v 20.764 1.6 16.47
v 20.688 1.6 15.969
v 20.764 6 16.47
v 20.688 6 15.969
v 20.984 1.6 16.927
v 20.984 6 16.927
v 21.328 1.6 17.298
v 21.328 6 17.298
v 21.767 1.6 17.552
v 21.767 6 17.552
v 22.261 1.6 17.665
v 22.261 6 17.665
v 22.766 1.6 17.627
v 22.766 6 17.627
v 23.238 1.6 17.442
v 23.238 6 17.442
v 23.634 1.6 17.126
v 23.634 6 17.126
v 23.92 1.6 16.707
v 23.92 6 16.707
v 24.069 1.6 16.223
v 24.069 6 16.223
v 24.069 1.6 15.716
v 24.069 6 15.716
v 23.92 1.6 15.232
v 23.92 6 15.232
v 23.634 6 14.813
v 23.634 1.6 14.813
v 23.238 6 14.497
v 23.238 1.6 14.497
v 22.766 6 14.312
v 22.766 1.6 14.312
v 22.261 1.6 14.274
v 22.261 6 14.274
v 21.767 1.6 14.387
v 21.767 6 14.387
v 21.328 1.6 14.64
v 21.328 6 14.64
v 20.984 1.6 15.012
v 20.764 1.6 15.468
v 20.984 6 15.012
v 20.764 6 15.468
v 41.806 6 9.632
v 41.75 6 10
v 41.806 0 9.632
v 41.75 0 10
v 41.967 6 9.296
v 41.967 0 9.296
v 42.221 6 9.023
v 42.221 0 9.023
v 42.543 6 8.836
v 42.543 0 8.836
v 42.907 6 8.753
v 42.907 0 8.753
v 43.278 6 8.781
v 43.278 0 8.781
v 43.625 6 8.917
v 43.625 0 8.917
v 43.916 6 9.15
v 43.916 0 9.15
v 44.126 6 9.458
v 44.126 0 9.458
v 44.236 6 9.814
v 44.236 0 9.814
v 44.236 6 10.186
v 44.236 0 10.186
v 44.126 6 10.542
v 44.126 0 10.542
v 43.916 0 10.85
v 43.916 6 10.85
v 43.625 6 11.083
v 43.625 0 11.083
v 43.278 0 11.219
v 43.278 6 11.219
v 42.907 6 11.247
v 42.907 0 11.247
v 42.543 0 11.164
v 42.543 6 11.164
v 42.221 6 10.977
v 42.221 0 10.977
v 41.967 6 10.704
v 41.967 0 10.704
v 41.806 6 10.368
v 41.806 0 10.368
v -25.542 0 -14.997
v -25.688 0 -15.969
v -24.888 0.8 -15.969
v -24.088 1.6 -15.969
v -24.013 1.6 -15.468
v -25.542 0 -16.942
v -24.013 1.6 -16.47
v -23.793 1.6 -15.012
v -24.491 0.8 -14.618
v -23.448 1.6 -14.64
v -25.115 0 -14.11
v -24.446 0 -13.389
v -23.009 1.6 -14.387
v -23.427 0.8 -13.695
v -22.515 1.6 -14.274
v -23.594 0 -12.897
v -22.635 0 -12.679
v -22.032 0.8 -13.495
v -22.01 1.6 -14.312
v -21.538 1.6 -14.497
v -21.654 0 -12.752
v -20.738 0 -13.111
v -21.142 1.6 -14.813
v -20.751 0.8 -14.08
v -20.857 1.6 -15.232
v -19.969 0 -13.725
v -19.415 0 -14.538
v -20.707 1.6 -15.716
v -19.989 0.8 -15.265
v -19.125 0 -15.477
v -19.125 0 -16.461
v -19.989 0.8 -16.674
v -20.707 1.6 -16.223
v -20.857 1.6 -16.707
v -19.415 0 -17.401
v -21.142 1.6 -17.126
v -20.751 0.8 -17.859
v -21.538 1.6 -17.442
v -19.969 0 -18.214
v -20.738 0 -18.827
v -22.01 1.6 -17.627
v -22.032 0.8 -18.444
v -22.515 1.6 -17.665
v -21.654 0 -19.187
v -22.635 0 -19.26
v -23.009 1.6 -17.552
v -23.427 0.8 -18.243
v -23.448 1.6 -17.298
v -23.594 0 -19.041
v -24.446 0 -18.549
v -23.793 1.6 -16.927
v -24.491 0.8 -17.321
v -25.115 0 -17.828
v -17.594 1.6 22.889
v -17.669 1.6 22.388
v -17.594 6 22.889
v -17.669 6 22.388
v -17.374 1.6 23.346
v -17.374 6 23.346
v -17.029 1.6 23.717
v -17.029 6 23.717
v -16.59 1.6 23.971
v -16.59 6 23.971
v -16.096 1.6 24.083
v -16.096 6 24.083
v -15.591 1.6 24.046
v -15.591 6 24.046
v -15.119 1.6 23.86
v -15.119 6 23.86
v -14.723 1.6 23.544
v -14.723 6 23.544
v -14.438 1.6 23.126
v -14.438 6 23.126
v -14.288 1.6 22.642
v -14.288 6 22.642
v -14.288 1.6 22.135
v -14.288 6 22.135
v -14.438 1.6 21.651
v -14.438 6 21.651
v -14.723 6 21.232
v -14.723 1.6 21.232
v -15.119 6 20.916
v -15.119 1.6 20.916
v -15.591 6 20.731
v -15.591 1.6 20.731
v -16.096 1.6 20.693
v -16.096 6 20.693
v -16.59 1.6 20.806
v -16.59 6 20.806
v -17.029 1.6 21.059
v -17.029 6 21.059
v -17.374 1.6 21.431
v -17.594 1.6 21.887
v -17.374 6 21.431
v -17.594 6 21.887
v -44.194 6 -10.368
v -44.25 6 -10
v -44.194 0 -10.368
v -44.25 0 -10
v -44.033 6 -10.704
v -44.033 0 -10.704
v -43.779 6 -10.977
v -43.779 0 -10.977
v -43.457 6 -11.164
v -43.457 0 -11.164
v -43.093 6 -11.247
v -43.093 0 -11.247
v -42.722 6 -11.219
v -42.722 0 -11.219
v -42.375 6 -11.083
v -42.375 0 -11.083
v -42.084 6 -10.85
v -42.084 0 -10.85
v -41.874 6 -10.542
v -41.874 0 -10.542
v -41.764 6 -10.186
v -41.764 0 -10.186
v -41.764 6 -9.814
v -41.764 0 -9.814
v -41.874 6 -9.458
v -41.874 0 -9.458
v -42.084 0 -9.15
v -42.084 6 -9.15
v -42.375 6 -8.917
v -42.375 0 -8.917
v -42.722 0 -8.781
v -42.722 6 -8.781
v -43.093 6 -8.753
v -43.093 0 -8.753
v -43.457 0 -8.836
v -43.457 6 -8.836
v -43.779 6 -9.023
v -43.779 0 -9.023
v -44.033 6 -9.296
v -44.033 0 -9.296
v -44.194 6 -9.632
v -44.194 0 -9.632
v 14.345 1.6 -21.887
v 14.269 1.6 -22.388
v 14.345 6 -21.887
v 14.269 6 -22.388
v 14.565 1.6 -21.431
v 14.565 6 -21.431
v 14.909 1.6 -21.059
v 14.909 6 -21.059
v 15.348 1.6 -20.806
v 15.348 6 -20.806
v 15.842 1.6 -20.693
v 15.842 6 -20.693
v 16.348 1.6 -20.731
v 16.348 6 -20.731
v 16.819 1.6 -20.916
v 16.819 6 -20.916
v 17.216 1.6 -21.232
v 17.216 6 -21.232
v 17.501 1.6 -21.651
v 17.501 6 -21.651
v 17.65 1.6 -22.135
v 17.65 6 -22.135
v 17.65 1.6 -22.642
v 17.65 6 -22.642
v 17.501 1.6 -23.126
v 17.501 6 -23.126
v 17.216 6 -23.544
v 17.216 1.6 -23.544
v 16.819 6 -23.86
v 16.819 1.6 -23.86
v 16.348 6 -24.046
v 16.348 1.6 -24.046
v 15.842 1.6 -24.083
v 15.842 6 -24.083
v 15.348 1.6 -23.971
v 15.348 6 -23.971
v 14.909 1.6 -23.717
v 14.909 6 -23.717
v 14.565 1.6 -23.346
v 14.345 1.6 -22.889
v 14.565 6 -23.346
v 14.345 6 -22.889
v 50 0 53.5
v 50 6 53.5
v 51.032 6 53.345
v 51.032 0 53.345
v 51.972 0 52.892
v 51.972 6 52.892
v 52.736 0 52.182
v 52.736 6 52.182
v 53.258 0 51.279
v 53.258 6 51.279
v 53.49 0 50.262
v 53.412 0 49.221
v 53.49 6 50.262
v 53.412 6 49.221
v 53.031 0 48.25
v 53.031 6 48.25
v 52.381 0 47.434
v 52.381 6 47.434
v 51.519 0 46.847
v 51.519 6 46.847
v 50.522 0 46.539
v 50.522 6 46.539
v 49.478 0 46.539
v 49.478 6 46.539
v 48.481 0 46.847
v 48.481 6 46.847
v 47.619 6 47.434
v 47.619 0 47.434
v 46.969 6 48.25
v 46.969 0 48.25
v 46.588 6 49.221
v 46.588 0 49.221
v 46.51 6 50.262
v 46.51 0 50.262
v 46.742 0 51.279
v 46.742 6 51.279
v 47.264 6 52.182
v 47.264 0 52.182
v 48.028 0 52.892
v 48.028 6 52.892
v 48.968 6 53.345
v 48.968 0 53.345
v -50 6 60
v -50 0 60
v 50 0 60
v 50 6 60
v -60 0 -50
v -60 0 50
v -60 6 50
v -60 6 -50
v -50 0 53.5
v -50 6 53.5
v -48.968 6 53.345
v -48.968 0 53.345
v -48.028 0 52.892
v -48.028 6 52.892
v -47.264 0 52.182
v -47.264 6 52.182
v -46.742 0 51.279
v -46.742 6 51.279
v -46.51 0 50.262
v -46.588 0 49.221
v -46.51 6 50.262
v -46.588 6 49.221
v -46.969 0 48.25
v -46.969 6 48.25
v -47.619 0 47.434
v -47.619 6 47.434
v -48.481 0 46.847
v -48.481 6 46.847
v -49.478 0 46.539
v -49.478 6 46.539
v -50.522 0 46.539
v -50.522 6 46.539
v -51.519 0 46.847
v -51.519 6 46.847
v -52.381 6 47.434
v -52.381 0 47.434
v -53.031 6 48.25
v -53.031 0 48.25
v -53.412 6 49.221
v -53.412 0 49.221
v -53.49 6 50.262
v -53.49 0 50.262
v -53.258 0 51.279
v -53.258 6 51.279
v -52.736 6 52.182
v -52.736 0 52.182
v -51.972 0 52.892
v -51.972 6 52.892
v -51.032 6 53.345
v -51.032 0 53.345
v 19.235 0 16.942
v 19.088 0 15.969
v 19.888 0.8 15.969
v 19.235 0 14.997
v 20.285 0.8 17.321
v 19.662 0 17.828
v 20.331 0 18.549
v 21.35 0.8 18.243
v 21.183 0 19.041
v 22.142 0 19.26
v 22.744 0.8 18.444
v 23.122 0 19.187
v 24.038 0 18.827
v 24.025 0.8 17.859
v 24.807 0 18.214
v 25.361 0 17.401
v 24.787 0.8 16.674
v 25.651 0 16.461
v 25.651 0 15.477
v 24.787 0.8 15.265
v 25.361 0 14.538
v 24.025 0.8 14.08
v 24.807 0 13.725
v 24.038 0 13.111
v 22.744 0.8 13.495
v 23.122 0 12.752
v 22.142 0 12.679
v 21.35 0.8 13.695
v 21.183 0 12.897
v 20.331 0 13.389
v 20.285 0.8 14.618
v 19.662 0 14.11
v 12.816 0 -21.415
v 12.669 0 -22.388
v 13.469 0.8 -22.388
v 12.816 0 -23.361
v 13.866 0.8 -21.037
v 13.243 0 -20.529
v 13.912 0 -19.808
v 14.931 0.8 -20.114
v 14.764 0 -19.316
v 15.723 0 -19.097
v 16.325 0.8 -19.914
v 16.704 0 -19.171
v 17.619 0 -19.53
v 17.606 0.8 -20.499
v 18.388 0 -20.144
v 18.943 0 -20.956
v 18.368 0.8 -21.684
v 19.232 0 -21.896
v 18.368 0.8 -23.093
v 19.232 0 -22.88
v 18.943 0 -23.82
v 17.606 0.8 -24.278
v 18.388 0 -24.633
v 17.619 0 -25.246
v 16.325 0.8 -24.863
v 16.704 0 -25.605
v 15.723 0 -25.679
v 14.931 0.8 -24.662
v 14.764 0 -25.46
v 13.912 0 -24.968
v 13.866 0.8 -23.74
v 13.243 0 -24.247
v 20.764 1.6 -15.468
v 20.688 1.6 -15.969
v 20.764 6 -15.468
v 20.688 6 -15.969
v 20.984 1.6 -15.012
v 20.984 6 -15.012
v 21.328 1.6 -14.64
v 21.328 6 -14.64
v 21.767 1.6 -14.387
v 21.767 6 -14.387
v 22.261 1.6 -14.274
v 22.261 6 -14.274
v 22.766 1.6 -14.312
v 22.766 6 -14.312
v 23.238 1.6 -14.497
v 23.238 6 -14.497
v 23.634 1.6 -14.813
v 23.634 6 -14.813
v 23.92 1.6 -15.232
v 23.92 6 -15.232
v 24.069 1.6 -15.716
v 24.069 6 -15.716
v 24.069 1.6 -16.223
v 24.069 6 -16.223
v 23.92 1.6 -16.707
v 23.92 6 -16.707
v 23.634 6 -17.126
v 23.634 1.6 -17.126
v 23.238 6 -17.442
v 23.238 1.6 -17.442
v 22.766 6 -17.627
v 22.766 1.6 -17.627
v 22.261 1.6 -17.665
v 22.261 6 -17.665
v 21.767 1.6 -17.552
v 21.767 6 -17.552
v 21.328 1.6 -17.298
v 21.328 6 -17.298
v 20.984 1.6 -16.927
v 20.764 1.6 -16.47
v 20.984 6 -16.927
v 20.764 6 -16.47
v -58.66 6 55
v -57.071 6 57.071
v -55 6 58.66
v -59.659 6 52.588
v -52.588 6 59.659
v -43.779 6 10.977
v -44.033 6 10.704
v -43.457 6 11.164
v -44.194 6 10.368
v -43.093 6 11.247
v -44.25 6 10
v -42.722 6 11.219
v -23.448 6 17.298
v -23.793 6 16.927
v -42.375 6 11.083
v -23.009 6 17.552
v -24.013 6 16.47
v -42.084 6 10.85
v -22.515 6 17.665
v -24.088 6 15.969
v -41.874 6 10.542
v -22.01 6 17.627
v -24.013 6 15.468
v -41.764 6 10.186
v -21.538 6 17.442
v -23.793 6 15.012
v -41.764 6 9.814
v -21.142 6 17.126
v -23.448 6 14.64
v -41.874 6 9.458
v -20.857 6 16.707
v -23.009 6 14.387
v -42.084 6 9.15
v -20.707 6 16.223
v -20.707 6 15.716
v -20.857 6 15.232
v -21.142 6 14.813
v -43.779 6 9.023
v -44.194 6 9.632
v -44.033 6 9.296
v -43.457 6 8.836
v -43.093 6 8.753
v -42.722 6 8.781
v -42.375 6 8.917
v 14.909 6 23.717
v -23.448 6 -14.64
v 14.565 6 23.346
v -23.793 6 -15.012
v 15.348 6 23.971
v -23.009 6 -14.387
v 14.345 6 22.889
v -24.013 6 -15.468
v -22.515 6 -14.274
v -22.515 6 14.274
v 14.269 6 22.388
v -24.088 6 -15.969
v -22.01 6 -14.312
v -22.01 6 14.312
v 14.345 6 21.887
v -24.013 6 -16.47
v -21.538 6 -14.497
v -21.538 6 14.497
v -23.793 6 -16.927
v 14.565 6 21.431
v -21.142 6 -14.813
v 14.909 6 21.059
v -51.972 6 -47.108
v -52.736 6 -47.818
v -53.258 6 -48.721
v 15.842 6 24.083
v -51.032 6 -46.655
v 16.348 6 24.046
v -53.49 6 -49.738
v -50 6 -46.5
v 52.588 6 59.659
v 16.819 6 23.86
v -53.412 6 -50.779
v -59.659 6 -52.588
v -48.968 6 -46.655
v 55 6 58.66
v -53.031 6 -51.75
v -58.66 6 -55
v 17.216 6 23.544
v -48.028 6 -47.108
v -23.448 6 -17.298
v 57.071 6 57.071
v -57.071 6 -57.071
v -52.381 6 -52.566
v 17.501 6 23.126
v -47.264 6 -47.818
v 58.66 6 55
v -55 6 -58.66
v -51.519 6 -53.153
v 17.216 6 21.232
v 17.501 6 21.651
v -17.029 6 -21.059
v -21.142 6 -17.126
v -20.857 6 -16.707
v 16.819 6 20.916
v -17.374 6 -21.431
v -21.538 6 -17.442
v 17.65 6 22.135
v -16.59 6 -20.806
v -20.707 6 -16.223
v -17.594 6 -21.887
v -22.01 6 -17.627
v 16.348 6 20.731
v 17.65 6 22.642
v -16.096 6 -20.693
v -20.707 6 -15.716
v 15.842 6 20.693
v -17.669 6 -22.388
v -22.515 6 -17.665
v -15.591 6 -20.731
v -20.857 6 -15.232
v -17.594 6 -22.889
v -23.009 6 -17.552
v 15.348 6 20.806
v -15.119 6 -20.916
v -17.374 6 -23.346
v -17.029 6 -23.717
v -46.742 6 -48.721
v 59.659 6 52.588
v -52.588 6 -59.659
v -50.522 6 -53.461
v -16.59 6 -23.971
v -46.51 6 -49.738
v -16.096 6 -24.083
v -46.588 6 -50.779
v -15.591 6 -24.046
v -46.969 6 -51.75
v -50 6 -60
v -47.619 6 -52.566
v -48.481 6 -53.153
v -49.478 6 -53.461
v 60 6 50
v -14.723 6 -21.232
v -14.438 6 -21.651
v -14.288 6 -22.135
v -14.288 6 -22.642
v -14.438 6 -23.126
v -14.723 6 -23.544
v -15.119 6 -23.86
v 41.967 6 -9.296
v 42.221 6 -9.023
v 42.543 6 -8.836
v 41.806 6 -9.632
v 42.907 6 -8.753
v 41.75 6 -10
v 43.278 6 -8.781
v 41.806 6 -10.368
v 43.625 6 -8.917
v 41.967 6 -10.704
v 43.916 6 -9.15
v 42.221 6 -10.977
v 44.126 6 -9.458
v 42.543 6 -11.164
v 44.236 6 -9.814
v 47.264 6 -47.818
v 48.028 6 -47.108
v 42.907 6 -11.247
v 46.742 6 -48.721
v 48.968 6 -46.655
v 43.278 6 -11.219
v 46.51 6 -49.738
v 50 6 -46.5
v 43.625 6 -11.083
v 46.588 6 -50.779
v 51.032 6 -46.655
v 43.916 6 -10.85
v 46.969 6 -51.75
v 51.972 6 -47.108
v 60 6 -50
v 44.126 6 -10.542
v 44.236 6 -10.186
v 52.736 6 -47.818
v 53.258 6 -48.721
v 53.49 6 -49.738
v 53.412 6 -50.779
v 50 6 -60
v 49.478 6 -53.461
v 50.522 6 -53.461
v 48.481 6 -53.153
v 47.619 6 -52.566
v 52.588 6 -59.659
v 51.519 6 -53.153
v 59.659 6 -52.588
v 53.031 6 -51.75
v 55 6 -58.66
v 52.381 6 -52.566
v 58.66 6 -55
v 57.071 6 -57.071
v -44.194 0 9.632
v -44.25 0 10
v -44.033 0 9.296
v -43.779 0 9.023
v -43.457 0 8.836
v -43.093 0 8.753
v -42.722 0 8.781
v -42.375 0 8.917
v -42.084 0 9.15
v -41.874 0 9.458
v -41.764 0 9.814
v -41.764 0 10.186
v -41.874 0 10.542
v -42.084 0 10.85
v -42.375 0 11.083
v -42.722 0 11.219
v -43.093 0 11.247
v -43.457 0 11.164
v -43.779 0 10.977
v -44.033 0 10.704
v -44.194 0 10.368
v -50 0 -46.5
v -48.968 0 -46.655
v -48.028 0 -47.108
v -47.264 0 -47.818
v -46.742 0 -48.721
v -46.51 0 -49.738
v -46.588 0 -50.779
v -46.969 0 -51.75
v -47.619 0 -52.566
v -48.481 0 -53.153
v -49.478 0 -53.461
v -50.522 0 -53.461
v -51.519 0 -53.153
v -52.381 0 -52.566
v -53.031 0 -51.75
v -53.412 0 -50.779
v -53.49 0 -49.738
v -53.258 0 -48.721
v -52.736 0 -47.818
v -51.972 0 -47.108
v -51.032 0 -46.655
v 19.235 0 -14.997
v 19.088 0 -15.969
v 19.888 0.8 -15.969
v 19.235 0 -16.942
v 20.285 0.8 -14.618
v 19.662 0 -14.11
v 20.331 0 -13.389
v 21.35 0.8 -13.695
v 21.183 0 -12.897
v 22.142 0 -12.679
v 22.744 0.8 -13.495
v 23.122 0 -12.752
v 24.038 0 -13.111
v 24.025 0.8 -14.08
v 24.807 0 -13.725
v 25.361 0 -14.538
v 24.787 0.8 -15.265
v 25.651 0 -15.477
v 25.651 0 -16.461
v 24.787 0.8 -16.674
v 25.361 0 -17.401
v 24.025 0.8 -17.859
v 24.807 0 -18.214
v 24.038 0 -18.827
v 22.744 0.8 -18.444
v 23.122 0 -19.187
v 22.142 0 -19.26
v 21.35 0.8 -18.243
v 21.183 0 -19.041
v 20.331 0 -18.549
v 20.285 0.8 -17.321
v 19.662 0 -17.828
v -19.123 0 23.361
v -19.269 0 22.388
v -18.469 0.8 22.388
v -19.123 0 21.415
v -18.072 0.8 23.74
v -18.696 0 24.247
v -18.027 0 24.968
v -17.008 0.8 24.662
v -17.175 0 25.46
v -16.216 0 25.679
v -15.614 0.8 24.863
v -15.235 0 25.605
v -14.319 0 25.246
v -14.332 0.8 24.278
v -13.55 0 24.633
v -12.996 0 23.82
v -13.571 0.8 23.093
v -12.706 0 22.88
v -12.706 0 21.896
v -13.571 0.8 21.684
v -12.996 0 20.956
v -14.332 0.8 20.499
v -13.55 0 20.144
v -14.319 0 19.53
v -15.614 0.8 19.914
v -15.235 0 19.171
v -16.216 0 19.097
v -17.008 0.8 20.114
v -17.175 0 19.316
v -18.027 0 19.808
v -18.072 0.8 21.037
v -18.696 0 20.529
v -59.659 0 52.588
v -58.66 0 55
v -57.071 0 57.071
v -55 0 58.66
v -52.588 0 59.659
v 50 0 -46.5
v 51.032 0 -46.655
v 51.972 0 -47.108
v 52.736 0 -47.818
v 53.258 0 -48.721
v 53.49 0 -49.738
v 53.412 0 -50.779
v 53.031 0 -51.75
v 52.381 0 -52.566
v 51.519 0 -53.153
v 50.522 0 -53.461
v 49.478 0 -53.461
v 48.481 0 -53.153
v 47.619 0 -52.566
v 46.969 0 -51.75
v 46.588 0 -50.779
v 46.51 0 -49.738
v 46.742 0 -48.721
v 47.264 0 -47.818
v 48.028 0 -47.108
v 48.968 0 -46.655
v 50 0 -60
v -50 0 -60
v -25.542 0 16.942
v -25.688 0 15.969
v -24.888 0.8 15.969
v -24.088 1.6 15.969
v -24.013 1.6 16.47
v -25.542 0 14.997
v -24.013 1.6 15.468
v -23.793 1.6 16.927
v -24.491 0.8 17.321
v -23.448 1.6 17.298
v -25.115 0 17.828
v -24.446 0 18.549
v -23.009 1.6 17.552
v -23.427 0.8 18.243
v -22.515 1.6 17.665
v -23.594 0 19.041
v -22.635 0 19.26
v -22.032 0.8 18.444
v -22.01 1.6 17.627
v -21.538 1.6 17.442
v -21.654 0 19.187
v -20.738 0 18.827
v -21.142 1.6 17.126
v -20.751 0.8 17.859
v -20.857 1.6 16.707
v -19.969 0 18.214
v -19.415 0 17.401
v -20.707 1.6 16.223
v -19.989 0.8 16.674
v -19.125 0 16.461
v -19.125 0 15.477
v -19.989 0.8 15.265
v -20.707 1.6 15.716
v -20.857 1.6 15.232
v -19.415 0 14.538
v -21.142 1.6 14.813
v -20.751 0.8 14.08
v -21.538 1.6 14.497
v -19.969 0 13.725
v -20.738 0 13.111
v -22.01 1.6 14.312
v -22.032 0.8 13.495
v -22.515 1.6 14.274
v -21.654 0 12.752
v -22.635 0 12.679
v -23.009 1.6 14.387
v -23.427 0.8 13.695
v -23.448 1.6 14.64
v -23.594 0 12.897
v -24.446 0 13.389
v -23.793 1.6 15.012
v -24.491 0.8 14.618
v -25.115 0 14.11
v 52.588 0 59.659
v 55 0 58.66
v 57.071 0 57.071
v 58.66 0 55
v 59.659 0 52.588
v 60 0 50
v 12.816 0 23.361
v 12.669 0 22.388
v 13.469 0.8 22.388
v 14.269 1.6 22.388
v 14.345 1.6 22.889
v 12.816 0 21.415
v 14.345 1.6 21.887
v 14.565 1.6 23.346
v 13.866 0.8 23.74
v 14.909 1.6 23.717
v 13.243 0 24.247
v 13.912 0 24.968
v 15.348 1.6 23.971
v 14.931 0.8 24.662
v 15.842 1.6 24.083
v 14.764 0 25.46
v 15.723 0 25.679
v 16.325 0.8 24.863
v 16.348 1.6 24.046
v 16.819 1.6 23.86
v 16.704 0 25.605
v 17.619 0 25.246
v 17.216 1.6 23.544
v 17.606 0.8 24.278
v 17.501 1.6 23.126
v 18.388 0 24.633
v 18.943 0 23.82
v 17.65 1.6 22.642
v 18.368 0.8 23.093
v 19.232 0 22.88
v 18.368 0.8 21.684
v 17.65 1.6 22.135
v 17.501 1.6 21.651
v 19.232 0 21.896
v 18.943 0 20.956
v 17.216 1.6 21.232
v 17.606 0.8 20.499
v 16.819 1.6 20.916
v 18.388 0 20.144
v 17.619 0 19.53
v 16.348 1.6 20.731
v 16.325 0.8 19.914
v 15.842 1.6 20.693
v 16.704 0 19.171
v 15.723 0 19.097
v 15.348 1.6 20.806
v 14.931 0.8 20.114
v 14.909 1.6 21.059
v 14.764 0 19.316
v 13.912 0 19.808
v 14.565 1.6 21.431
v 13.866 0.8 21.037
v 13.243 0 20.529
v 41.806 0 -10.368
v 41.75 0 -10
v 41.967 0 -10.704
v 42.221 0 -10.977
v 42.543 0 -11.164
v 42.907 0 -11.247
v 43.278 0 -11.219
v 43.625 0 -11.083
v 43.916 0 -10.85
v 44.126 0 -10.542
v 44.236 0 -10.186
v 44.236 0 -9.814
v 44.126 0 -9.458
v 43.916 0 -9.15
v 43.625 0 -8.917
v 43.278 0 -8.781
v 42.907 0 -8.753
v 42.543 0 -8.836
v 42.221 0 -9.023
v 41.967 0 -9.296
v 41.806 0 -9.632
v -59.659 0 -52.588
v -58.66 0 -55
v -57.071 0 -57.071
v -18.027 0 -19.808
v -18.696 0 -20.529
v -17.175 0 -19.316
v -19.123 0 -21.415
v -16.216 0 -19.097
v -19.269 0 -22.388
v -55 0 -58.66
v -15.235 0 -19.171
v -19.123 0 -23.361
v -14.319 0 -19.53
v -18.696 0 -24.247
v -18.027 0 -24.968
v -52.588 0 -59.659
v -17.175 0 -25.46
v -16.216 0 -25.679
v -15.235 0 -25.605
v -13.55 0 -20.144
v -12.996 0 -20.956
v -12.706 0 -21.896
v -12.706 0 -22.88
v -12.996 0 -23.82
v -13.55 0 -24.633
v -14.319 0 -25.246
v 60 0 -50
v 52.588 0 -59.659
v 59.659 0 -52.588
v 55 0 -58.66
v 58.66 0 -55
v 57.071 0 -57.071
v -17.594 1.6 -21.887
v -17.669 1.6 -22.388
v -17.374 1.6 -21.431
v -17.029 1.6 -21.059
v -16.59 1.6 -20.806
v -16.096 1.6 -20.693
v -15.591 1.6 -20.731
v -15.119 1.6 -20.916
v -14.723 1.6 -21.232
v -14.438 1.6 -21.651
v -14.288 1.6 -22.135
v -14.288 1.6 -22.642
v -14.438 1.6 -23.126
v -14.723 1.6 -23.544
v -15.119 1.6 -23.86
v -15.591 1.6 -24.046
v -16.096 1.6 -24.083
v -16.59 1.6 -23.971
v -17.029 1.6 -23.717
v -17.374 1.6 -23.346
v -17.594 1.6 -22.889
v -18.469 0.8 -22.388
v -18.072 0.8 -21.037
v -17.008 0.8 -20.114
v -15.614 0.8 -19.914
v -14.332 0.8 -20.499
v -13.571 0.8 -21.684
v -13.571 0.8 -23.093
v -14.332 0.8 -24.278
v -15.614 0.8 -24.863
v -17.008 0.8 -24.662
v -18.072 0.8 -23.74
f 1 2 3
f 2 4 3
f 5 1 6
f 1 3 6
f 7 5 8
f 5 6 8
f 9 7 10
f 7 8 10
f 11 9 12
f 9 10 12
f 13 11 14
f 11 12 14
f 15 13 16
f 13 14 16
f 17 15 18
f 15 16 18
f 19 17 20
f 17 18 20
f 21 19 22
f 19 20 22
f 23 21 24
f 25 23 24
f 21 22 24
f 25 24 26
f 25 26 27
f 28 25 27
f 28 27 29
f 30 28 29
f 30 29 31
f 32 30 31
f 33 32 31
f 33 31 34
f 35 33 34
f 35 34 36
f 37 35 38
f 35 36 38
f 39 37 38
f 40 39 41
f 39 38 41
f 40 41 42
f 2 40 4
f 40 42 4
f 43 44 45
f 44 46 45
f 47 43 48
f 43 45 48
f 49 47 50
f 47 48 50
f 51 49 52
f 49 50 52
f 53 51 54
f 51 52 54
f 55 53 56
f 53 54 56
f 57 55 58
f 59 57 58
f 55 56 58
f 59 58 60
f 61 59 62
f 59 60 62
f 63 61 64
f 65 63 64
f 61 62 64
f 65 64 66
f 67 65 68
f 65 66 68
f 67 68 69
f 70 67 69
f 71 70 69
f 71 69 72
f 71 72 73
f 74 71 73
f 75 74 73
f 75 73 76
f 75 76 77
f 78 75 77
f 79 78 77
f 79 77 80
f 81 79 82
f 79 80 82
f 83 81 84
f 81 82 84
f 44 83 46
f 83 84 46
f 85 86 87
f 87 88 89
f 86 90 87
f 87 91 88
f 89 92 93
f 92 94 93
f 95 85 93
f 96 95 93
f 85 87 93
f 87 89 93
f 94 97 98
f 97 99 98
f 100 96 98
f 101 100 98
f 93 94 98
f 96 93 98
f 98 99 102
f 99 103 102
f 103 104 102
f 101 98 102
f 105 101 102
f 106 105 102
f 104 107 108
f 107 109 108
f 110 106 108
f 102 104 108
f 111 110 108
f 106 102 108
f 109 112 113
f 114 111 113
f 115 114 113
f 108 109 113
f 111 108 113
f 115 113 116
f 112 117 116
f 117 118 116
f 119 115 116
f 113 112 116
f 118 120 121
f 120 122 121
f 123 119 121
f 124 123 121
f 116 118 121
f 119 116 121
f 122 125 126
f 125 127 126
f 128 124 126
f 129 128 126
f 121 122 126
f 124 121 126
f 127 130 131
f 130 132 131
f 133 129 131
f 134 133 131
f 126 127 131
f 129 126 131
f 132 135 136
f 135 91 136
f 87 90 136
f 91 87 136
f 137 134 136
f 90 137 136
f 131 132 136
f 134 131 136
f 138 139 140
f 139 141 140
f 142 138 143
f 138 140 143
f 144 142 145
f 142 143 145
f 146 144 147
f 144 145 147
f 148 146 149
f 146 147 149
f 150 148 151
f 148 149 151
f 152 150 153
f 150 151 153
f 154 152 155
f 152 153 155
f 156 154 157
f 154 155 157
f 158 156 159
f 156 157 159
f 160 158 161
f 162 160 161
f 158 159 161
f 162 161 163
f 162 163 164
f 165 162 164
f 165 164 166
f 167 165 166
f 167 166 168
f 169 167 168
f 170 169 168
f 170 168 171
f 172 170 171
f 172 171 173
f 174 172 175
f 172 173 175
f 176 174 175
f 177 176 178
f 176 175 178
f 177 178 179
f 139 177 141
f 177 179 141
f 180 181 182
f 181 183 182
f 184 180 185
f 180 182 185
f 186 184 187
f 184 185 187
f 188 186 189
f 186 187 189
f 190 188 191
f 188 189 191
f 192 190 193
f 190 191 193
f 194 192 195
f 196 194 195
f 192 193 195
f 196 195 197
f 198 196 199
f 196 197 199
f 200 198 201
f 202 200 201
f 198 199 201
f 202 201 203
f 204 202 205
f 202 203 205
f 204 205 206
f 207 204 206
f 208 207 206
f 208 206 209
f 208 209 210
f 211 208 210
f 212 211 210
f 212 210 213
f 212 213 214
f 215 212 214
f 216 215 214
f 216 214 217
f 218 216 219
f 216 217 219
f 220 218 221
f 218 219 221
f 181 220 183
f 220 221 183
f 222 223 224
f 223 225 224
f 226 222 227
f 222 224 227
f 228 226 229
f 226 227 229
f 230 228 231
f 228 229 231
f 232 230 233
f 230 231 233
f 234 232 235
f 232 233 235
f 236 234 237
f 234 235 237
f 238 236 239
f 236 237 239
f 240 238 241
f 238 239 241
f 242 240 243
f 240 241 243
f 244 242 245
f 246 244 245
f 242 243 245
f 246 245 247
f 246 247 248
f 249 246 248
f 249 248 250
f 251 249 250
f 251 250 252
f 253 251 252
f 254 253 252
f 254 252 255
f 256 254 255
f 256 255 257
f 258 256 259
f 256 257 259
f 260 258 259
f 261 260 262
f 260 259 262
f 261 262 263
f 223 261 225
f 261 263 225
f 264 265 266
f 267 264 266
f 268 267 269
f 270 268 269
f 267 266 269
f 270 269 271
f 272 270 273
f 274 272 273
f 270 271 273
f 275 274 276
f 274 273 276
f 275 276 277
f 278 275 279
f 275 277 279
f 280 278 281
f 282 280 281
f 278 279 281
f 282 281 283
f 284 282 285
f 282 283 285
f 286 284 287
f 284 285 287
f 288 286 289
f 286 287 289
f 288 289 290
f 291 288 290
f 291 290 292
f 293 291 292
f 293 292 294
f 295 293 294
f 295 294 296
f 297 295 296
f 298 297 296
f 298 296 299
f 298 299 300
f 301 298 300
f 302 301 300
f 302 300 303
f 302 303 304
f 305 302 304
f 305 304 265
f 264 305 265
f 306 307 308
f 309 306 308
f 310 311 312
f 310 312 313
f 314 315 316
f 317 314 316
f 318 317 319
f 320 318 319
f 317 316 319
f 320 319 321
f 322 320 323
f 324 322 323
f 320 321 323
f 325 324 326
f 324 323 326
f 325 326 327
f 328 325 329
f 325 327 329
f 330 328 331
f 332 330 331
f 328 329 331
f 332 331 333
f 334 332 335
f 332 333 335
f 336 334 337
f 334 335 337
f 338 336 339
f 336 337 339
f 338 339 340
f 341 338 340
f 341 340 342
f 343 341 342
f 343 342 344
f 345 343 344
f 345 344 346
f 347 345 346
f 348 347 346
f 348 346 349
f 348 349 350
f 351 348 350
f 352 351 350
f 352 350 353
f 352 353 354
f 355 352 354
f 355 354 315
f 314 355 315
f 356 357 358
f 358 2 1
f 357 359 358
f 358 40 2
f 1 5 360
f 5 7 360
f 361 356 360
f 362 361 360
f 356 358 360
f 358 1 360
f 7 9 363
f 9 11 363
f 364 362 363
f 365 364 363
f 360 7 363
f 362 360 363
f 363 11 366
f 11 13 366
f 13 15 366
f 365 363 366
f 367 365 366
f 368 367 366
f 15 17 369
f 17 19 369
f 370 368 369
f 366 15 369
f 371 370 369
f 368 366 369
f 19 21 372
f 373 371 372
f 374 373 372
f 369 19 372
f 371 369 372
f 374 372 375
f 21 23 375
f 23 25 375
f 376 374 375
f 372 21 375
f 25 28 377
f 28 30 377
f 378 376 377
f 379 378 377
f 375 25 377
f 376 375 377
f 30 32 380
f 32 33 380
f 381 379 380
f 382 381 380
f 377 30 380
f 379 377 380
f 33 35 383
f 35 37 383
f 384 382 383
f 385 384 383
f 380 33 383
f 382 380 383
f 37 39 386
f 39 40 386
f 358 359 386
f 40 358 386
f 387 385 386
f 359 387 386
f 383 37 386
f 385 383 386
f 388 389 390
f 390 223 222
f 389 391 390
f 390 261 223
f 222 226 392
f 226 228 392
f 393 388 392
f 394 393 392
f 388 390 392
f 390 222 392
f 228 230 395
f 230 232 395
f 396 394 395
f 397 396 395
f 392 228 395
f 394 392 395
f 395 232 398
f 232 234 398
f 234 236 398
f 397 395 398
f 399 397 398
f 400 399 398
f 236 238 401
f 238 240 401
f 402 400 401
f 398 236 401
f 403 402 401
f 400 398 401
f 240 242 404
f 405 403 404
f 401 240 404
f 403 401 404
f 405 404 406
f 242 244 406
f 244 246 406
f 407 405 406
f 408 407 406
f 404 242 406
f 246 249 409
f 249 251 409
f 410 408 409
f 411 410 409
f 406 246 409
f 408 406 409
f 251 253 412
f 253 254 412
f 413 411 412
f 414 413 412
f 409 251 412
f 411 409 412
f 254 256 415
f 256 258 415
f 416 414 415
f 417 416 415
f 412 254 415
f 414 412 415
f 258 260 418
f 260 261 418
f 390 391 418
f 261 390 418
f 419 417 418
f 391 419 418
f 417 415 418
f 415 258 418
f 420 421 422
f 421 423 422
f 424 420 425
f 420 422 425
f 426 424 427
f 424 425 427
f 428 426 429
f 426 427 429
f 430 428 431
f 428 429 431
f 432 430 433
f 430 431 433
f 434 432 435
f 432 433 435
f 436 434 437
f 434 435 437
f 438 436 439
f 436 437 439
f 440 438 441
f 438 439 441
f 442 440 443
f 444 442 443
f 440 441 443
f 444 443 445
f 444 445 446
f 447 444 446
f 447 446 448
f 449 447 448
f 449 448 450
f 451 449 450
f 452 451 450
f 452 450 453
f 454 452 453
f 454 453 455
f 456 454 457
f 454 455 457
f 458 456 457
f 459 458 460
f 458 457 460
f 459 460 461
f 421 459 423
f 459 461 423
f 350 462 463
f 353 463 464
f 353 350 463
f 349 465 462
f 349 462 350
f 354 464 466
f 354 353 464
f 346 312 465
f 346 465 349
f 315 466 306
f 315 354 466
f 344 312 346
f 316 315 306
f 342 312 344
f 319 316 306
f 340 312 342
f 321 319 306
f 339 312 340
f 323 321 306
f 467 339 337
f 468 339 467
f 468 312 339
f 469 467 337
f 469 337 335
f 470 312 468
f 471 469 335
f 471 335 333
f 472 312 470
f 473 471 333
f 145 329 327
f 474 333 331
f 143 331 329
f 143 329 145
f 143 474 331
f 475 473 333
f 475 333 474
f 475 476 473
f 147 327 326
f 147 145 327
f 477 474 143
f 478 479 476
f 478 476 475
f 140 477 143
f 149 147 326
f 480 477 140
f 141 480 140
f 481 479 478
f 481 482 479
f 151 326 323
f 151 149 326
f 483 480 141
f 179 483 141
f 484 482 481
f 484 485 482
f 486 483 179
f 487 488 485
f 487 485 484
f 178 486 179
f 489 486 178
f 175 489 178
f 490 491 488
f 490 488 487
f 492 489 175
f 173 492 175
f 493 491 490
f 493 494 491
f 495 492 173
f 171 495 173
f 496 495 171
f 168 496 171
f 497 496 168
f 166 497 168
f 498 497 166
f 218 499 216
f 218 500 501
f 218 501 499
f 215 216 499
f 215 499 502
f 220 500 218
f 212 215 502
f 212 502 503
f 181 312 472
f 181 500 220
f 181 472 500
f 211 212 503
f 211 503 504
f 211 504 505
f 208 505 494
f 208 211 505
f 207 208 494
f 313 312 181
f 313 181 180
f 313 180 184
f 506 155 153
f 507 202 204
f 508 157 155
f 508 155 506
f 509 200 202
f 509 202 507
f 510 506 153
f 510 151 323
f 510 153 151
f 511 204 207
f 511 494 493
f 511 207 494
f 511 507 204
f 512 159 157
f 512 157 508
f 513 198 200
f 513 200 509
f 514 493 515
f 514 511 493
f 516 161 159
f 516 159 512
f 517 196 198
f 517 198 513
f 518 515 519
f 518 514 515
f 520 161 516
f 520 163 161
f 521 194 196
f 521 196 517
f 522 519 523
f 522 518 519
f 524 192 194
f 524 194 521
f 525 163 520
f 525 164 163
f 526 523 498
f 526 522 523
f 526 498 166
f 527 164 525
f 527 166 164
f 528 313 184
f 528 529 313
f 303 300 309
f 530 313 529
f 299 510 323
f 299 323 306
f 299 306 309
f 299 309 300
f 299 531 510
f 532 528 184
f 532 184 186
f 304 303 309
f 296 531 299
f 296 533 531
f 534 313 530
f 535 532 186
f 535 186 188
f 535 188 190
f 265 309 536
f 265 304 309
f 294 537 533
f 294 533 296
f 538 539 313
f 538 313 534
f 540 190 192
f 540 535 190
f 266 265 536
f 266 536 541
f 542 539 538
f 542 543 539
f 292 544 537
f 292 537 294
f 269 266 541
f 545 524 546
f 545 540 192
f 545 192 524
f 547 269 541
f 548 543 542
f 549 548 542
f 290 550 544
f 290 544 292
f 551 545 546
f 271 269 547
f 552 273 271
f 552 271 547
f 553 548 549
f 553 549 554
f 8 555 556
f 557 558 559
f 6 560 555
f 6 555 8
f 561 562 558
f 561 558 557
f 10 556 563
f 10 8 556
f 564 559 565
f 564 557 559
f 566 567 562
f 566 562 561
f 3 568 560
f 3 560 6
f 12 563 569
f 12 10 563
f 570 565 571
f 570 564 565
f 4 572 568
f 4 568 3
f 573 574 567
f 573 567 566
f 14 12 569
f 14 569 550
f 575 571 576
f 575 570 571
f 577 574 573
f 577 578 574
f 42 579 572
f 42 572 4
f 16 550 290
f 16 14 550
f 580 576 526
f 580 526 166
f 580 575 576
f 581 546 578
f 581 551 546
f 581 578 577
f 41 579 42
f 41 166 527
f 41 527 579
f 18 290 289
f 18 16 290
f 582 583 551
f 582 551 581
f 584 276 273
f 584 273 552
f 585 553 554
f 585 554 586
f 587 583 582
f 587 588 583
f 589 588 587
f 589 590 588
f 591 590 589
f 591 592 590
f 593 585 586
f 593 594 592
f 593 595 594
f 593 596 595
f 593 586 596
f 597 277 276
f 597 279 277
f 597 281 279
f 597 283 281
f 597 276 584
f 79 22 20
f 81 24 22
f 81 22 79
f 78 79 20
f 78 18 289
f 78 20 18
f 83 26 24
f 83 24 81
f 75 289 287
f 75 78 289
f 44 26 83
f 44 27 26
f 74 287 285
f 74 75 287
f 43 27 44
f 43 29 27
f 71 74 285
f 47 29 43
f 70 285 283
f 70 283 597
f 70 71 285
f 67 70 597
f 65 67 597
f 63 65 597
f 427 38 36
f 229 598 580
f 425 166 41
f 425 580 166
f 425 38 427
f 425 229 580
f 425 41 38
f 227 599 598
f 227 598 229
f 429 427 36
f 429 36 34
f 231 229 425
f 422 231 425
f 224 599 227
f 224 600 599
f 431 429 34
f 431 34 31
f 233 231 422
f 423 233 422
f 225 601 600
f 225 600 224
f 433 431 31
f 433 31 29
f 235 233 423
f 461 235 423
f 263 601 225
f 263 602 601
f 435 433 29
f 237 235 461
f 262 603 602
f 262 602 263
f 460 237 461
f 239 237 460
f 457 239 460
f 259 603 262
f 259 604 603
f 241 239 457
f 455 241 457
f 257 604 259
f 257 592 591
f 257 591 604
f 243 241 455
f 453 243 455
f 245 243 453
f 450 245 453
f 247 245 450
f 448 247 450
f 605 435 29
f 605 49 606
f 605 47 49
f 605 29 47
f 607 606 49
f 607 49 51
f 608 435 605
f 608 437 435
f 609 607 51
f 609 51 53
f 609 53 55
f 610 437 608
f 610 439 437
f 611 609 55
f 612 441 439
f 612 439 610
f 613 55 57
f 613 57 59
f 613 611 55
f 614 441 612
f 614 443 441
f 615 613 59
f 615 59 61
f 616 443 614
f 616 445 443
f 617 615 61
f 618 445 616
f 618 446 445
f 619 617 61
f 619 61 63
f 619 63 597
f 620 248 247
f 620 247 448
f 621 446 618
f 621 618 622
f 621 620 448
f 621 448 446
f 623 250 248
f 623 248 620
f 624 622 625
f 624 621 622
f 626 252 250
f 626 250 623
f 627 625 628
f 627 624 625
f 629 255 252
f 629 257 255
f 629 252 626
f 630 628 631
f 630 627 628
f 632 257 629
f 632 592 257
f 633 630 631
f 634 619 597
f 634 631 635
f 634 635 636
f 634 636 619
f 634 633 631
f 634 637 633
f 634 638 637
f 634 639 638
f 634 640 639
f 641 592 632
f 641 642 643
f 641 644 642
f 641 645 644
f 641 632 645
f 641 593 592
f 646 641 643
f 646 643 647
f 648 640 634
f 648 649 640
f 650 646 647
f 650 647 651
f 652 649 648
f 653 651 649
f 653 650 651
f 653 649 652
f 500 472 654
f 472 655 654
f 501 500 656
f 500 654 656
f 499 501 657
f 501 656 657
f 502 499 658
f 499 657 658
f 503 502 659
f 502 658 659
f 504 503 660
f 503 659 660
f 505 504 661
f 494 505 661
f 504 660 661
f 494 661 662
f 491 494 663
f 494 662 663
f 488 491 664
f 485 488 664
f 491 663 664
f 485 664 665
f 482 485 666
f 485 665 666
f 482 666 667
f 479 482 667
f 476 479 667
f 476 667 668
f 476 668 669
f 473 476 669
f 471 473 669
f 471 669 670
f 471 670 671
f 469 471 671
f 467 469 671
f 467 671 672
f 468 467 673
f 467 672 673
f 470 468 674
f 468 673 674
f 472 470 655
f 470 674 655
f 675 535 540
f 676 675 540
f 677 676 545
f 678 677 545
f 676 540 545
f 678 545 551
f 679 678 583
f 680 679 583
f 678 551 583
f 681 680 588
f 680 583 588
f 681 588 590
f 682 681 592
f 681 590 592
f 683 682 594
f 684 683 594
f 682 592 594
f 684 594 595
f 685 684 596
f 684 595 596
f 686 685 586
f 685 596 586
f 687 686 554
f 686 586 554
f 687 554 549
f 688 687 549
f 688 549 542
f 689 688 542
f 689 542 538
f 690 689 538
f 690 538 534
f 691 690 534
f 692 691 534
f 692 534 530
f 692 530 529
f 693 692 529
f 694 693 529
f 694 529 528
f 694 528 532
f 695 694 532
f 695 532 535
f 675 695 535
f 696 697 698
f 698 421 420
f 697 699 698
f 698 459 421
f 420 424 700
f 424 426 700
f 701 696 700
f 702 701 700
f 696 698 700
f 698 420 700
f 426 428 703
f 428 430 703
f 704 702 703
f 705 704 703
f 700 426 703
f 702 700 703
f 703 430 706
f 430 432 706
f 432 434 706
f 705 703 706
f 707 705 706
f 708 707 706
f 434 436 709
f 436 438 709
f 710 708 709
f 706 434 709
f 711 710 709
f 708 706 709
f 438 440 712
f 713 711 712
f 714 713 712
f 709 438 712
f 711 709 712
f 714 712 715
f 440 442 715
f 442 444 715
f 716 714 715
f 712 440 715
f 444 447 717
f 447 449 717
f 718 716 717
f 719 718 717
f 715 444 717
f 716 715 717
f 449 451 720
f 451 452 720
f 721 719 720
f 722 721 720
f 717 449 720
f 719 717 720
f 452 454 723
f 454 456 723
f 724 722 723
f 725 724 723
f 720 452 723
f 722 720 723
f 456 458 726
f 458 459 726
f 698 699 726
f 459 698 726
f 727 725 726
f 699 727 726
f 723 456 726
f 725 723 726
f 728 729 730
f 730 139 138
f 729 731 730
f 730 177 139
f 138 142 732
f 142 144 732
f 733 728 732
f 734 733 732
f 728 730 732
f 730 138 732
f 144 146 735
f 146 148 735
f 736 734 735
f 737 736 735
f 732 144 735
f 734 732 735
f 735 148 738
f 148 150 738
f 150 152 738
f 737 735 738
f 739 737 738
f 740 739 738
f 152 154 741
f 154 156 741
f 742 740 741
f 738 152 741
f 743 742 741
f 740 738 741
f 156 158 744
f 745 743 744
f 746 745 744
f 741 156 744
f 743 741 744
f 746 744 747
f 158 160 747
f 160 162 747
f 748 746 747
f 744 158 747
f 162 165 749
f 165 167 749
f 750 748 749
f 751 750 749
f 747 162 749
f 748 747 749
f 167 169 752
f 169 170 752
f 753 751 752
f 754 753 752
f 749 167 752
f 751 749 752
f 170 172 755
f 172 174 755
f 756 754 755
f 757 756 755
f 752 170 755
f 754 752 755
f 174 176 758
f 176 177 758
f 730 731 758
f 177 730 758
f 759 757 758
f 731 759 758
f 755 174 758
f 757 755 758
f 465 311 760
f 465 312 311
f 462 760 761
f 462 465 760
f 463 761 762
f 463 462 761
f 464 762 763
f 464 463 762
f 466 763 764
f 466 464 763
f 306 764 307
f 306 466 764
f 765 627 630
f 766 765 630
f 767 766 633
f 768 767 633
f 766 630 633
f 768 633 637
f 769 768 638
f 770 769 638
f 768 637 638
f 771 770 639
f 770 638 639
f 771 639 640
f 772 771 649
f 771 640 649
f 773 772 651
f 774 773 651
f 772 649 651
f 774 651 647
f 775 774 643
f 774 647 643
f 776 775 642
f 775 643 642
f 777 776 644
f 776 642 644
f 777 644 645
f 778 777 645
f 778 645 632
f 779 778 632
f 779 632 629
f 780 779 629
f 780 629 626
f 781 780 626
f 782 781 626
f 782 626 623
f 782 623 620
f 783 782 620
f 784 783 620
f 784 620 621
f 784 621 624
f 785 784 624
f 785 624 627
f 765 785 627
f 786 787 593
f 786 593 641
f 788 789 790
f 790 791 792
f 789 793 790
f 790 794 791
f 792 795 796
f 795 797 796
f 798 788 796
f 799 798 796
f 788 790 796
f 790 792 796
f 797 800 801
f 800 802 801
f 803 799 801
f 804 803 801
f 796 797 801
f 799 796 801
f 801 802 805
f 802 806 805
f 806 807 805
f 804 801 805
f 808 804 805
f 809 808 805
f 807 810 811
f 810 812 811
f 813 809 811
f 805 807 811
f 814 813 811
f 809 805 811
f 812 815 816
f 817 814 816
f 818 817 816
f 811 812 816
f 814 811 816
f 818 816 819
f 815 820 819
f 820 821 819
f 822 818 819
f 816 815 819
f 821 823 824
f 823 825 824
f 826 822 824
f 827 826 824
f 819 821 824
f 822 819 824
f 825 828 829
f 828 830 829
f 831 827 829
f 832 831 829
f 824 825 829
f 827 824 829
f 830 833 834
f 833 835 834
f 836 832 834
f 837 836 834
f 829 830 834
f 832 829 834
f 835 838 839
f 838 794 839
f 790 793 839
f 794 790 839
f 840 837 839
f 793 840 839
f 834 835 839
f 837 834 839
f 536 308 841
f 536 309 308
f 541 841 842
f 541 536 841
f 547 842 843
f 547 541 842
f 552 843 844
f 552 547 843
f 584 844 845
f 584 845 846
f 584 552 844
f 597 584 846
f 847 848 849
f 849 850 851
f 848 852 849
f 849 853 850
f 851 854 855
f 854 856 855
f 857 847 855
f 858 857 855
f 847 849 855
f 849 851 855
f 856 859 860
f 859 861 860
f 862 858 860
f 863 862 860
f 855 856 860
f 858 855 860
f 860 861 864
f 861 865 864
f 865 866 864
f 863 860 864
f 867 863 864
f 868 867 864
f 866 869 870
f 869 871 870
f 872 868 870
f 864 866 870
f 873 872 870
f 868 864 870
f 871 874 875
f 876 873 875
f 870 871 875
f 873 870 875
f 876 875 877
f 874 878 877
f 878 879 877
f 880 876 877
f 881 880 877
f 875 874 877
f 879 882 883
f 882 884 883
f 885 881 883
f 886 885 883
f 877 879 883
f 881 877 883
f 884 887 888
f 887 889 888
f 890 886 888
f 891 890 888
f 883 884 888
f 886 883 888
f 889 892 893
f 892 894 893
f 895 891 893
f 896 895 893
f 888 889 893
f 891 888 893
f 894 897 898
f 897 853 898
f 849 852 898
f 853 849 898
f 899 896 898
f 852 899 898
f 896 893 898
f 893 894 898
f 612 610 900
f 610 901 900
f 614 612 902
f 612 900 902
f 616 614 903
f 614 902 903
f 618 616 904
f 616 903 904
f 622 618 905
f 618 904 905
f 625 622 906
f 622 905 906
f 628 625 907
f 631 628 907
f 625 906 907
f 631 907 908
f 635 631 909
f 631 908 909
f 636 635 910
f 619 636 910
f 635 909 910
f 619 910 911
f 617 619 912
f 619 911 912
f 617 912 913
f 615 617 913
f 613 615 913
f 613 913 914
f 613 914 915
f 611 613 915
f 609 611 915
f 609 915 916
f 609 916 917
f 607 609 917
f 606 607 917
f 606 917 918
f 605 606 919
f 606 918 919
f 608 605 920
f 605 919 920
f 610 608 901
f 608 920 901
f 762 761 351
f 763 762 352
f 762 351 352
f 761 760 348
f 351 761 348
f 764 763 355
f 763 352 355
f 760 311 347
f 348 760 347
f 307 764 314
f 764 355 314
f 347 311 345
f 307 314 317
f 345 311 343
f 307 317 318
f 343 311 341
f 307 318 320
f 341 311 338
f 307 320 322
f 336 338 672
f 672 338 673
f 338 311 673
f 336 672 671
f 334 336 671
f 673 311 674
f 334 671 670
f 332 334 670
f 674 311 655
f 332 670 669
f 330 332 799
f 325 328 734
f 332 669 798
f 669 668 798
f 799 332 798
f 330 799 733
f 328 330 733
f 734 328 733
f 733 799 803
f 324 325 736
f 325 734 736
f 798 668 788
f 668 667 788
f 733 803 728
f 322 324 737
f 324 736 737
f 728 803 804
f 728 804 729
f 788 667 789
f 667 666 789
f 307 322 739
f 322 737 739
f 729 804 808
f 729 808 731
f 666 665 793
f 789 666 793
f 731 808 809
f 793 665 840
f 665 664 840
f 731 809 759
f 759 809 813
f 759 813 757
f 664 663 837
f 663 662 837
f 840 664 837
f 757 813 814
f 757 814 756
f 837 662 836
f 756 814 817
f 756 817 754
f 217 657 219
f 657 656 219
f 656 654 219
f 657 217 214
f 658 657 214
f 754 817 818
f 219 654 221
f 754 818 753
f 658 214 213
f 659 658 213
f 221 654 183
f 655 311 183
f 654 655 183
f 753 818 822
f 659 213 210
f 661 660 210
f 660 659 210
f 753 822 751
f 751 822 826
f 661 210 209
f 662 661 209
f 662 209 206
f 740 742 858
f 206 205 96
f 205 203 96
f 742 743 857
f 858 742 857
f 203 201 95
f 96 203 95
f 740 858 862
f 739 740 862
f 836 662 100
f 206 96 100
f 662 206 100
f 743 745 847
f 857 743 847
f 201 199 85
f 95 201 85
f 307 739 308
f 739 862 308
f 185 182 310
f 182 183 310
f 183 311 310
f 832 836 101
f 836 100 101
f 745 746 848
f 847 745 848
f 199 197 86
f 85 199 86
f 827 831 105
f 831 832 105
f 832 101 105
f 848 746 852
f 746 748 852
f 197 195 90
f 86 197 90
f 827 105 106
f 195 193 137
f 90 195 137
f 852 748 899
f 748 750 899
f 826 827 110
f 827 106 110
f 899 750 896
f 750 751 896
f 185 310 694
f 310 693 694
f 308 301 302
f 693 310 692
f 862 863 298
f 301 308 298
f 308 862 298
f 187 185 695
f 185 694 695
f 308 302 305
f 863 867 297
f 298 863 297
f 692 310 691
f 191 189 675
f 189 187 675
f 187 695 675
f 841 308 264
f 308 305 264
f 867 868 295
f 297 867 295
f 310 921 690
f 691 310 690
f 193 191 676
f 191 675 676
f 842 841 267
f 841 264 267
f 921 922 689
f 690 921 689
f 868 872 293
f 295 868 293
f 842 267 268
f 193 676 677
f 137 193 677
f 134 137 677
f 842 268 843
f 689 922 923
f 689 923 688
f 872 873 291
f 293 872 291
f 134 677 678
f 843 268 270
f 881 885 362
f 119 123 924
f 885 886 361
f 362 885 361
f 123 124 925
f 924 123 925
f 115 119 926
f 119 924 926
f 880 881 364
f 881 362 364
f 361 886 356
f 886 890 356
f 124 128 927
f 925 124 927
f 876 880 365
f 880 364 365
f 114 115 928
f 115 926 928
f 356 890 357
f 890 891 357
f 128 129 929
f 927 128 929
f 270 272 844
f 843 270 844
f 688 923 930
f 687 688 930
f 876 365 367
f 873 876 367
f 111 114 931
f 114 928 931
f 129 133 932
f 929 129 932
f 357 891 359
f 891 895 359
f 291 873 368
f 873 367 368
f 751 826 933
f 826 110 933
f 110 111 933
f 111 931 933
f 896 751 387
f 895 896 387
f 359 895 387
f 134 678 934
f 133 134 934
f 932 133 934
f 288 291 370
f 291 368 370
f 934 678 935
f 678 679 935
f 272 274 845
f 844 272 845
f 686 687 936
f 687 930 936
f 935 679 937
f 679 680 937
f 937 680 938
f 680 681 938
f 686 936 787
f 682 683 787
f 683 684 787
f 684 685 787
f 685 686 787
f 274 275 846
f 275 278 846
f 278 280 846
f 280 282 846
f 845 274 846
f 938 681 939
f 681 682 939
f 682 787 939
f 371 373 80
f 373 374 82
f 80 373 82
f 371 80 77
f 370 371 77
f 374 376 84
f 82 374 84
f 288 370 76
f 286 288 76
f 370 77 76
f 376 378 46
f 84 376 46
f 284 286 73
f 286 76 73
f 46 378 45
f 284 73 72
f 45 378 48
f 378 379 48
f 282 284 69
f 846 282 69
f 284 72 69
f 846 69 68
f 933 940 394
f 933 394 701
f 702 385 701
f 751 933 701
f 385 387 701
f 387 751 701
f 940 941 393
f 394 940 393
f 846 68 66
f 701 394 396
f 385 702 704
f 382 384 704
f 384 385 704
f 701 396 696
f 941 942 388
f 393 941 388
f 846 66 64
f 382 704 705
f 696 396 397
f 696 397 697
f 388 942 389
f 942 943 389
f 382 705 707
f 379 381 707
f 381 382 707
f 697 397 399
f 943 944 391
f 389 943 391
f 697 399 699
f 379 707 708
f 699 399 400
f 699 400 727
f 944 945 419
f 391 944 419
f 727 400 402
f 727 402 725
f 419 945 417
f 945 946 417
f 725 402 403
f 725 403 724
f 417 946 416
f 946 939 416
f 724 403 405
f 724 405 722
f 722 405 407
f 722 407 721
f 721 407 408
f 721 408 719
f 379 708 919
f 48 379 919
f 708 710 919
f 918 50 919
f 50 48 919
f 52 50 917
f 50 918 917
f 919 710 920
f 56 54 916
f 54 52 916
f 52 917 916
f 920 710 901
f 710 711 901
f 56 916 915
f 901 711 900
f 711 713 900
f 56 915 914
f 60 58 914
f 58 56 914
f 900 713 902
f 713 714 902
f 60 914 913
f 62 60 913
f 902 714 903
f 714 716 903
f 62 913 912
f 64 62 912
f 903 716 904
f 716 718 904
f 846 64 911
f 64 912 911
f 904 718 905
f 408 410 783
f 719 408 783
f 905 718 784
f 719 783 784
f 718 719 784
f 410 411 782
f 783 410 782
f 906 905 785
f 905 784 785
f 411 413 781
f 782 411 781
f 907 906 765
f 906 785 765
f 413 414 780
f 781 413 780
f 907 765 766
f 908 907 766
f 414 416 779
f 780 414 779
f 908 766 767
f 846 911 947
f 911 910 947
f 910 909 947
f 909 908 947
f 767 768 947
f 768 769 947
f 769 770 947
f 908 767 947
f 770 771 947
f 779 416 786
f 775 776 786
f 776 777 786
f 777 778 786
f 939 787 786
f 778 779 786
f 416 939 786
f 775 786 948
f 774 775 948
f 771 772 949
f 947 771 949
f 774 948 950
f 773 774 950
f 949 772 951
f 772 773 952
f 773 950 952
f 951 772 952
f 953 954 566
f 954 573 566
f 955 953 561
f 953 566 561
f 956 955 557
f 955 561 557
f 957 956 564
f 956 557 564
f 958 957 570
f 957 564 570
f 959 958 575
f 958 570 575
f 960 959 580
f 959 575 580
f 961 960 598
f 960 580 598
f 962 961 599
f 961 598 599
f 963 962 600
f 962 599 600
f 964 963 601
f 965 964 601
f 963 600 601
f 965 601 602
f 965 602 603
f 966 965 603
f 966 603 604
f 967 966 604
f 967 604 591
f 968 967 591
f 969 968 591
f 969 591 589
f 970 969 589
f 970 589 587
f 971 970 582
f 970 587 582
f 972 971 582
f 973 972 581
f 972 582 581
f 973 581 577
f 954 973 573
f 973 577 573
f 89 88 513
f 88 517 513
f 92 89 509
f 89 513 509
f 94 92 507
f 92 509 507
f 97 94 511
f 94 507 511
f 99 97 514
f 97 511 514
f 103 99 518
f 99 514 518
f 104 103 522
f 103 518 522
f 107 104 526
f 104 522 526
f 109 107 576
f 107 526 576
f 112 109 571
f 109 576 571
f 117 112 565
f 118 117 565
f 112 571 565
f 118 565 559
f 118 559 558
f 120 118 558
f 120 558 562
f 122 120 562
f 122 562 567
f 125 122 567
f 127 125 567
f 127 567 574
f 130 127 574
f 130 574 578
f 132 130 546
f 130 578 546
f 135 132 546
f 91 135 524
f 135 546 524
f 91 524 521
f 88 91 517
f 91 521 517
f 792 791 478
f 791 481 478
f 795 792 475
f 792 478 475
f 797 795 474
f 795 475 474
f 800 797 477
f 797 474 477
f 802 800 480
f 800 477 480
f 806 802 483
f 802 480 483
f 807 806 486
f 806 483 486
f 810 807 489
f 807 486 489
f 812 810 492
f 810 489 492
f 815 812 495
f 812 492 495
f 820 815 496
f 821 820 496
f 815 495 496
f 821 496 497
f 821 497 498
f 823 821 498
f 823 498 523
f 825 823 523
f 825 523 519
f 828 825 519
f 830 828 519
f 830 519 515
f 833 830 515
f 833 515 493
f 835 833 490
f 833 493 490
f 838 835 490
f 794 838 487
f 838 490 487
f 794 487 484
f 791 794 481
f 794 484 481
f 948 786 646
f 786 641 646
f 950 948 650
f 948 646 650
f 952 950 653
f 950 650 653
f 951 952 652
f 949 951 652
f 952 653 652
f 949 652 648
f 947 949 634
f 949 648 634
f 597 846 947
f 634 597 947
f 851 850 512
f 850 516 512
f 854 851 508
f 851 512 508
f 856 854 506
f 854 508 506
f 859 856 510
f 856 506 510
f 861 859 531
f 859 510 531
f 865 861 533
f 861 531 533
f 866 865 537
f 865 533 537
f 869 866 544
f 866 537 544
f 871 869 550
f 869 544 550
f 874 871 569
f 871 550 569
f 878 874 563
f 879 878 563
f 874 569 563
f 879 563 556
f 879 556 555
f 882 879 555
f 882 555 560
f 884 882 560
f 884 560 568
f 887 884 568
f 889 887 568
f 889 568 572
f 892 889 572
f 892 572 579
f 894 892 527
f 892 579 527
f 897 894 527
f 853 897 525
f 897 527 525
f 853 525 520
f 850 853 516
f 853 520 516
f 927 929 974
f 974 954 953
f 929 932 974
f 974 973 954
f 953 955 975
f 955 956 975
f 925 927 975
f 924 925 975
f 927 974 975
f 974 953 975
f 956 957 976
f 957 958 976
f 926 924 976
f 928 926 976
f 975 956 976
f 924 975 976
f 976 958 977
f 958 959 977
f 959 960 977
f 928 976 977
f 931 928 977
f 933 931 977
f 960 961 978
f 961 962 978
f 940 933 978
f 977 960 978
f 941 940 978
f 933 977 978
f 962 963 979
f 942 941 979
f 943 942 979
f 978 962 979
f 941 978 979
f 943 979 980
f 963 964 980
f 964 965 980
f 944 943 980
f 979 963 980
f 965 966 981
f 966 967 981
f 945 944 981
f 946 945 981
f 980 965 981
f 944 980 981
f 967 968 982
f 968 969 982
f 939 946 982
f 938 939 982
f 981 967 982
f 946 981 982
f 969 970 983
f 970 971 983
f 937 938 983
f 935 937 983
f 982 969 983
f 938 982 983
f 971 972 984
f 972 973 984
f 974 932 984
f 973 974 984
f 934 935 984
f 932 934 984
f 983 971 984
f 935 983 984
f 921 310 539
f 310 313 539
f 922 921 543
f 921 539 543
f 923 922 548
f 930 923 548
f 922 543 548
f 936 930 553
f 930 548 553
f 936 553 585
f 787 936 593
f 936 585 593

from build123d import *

# Parameters (mm, degrees)
SKETCH_1_W                   = 120
SKETCH_1_H                   = 120
EXTRUDE_1_DEPTH              = 6
SKETCH_2_R                   = 3.5
CUT_EXTRUDE_1_DEPTH          = 10
FILLET_1_R                   = 10
HOLE_WIZARD_M3_1_D           = 3.4
HOLE_WIZARD_M3_1_CSINK_D     = 6.6
HOLE_WIZARD_M3_1_CSINK_ANGLE = 90
HOLE_WIZARD_M3_1_2_D         = 2.5
HOLE_WIZARD_M3_1_2_DEPTH     = 6
HOLE_WIZARD_M3_1_2_TIP       = 0.751075774


with BuildPart() as part:
    # 草图1 → 凸台-拉伸1 (new body)
    with BuildSketch(Plane(origin=(0, 0, 0), x_dir=(1, 0, 0), z_dir=(0, 1, 0))):
        Rectangle(SKETCH_1_W, SKETCH_1_H)
    extrude(amount=EXTRUDE_1_DEPTH)

    # 草图2 → 切除-拉伸1 (cut)
    with BuildSketch(Plane(origin=(0, 6, 0), x_dir=(1, 0, 0), z_dir=(0, 1, 0))):
        with Locations(Location((-50, 50, 0), (0, 0, 270))):
            Circle(SKETCH_2_R)
        with Locations(Location((50, 50, 0), (0, 0, 270))):
            Circle(SKETCH_2_R)
        with Locations(Location((50, -50, 0), (0, 0, 270))):
            Circle(SKETCH_2_R)
        with Locations(Location((-50, -50, 0), (0, 0, 270))):
            Circle(SKETCH_2_R)
    extrude(amount=-CUT_EXTRUDE_1_DEPTH, mode=Mode.SUBTRACT)

    # 圆角1
    fillet_1_edges = [part.edges().sort_by_distance(p)[0] for p in [
        (60, 3, 60),
        (-60, 3, 60),
        (-60, 3, -60),
        (60, 3, -60),
    ]]
    fillet(fillet_1_edges, radius=FILLET_1_R)

    # Hole Wizard M3 _1 (through all)
    with Locations(Plane.XZ):
        with Locations((15.969331282, -22.388176755), (22.388176755, -15.969331282), (22.388176755, 15.969331282), (15.969331282, 22.388176755), (-15.969331282, 22.388176755), (-22.388176755, 15.969331282), (-22.388176755, -15.969331282), (-15.969331282, -22.388176755)):
            CounterSinkHole(HOLE_WIZARD_M3_1_D / 2, HOLE_WIZARD_M3_1_CSINK_D / 2, counter_sink_angle=HOLE_WIZARD_M3_1_CSINK_ANGLE)

    # Hole Wizard M3 _1 2
    with Locations(Plane(origin=(0, 6, 0), x_dir=(1, 0, 0), z_dir=(0, 1, 0))):
        with Locations((-43, -10), (-43, 10), (43, -10), (43, 10)):
            Hole(HOLE_WIZARD_M3_1_2_D / 2, depth=HOLE_WIZARD_M3_1_2_DEPTH)
            with Locations((0, 0, -(HOLE_WIZARD_M3_1_2_DEPTH + HOLE_WIZARD_M3_1_2_TIP / 2))):  # 118° drill point
                Cone(0, HOLE_WIZARD_M3_1_2_D / 2, HOLE_WIZARD_M3_1_2_TIP, mode=Mode.SUBTRACT)


solid = part.part
